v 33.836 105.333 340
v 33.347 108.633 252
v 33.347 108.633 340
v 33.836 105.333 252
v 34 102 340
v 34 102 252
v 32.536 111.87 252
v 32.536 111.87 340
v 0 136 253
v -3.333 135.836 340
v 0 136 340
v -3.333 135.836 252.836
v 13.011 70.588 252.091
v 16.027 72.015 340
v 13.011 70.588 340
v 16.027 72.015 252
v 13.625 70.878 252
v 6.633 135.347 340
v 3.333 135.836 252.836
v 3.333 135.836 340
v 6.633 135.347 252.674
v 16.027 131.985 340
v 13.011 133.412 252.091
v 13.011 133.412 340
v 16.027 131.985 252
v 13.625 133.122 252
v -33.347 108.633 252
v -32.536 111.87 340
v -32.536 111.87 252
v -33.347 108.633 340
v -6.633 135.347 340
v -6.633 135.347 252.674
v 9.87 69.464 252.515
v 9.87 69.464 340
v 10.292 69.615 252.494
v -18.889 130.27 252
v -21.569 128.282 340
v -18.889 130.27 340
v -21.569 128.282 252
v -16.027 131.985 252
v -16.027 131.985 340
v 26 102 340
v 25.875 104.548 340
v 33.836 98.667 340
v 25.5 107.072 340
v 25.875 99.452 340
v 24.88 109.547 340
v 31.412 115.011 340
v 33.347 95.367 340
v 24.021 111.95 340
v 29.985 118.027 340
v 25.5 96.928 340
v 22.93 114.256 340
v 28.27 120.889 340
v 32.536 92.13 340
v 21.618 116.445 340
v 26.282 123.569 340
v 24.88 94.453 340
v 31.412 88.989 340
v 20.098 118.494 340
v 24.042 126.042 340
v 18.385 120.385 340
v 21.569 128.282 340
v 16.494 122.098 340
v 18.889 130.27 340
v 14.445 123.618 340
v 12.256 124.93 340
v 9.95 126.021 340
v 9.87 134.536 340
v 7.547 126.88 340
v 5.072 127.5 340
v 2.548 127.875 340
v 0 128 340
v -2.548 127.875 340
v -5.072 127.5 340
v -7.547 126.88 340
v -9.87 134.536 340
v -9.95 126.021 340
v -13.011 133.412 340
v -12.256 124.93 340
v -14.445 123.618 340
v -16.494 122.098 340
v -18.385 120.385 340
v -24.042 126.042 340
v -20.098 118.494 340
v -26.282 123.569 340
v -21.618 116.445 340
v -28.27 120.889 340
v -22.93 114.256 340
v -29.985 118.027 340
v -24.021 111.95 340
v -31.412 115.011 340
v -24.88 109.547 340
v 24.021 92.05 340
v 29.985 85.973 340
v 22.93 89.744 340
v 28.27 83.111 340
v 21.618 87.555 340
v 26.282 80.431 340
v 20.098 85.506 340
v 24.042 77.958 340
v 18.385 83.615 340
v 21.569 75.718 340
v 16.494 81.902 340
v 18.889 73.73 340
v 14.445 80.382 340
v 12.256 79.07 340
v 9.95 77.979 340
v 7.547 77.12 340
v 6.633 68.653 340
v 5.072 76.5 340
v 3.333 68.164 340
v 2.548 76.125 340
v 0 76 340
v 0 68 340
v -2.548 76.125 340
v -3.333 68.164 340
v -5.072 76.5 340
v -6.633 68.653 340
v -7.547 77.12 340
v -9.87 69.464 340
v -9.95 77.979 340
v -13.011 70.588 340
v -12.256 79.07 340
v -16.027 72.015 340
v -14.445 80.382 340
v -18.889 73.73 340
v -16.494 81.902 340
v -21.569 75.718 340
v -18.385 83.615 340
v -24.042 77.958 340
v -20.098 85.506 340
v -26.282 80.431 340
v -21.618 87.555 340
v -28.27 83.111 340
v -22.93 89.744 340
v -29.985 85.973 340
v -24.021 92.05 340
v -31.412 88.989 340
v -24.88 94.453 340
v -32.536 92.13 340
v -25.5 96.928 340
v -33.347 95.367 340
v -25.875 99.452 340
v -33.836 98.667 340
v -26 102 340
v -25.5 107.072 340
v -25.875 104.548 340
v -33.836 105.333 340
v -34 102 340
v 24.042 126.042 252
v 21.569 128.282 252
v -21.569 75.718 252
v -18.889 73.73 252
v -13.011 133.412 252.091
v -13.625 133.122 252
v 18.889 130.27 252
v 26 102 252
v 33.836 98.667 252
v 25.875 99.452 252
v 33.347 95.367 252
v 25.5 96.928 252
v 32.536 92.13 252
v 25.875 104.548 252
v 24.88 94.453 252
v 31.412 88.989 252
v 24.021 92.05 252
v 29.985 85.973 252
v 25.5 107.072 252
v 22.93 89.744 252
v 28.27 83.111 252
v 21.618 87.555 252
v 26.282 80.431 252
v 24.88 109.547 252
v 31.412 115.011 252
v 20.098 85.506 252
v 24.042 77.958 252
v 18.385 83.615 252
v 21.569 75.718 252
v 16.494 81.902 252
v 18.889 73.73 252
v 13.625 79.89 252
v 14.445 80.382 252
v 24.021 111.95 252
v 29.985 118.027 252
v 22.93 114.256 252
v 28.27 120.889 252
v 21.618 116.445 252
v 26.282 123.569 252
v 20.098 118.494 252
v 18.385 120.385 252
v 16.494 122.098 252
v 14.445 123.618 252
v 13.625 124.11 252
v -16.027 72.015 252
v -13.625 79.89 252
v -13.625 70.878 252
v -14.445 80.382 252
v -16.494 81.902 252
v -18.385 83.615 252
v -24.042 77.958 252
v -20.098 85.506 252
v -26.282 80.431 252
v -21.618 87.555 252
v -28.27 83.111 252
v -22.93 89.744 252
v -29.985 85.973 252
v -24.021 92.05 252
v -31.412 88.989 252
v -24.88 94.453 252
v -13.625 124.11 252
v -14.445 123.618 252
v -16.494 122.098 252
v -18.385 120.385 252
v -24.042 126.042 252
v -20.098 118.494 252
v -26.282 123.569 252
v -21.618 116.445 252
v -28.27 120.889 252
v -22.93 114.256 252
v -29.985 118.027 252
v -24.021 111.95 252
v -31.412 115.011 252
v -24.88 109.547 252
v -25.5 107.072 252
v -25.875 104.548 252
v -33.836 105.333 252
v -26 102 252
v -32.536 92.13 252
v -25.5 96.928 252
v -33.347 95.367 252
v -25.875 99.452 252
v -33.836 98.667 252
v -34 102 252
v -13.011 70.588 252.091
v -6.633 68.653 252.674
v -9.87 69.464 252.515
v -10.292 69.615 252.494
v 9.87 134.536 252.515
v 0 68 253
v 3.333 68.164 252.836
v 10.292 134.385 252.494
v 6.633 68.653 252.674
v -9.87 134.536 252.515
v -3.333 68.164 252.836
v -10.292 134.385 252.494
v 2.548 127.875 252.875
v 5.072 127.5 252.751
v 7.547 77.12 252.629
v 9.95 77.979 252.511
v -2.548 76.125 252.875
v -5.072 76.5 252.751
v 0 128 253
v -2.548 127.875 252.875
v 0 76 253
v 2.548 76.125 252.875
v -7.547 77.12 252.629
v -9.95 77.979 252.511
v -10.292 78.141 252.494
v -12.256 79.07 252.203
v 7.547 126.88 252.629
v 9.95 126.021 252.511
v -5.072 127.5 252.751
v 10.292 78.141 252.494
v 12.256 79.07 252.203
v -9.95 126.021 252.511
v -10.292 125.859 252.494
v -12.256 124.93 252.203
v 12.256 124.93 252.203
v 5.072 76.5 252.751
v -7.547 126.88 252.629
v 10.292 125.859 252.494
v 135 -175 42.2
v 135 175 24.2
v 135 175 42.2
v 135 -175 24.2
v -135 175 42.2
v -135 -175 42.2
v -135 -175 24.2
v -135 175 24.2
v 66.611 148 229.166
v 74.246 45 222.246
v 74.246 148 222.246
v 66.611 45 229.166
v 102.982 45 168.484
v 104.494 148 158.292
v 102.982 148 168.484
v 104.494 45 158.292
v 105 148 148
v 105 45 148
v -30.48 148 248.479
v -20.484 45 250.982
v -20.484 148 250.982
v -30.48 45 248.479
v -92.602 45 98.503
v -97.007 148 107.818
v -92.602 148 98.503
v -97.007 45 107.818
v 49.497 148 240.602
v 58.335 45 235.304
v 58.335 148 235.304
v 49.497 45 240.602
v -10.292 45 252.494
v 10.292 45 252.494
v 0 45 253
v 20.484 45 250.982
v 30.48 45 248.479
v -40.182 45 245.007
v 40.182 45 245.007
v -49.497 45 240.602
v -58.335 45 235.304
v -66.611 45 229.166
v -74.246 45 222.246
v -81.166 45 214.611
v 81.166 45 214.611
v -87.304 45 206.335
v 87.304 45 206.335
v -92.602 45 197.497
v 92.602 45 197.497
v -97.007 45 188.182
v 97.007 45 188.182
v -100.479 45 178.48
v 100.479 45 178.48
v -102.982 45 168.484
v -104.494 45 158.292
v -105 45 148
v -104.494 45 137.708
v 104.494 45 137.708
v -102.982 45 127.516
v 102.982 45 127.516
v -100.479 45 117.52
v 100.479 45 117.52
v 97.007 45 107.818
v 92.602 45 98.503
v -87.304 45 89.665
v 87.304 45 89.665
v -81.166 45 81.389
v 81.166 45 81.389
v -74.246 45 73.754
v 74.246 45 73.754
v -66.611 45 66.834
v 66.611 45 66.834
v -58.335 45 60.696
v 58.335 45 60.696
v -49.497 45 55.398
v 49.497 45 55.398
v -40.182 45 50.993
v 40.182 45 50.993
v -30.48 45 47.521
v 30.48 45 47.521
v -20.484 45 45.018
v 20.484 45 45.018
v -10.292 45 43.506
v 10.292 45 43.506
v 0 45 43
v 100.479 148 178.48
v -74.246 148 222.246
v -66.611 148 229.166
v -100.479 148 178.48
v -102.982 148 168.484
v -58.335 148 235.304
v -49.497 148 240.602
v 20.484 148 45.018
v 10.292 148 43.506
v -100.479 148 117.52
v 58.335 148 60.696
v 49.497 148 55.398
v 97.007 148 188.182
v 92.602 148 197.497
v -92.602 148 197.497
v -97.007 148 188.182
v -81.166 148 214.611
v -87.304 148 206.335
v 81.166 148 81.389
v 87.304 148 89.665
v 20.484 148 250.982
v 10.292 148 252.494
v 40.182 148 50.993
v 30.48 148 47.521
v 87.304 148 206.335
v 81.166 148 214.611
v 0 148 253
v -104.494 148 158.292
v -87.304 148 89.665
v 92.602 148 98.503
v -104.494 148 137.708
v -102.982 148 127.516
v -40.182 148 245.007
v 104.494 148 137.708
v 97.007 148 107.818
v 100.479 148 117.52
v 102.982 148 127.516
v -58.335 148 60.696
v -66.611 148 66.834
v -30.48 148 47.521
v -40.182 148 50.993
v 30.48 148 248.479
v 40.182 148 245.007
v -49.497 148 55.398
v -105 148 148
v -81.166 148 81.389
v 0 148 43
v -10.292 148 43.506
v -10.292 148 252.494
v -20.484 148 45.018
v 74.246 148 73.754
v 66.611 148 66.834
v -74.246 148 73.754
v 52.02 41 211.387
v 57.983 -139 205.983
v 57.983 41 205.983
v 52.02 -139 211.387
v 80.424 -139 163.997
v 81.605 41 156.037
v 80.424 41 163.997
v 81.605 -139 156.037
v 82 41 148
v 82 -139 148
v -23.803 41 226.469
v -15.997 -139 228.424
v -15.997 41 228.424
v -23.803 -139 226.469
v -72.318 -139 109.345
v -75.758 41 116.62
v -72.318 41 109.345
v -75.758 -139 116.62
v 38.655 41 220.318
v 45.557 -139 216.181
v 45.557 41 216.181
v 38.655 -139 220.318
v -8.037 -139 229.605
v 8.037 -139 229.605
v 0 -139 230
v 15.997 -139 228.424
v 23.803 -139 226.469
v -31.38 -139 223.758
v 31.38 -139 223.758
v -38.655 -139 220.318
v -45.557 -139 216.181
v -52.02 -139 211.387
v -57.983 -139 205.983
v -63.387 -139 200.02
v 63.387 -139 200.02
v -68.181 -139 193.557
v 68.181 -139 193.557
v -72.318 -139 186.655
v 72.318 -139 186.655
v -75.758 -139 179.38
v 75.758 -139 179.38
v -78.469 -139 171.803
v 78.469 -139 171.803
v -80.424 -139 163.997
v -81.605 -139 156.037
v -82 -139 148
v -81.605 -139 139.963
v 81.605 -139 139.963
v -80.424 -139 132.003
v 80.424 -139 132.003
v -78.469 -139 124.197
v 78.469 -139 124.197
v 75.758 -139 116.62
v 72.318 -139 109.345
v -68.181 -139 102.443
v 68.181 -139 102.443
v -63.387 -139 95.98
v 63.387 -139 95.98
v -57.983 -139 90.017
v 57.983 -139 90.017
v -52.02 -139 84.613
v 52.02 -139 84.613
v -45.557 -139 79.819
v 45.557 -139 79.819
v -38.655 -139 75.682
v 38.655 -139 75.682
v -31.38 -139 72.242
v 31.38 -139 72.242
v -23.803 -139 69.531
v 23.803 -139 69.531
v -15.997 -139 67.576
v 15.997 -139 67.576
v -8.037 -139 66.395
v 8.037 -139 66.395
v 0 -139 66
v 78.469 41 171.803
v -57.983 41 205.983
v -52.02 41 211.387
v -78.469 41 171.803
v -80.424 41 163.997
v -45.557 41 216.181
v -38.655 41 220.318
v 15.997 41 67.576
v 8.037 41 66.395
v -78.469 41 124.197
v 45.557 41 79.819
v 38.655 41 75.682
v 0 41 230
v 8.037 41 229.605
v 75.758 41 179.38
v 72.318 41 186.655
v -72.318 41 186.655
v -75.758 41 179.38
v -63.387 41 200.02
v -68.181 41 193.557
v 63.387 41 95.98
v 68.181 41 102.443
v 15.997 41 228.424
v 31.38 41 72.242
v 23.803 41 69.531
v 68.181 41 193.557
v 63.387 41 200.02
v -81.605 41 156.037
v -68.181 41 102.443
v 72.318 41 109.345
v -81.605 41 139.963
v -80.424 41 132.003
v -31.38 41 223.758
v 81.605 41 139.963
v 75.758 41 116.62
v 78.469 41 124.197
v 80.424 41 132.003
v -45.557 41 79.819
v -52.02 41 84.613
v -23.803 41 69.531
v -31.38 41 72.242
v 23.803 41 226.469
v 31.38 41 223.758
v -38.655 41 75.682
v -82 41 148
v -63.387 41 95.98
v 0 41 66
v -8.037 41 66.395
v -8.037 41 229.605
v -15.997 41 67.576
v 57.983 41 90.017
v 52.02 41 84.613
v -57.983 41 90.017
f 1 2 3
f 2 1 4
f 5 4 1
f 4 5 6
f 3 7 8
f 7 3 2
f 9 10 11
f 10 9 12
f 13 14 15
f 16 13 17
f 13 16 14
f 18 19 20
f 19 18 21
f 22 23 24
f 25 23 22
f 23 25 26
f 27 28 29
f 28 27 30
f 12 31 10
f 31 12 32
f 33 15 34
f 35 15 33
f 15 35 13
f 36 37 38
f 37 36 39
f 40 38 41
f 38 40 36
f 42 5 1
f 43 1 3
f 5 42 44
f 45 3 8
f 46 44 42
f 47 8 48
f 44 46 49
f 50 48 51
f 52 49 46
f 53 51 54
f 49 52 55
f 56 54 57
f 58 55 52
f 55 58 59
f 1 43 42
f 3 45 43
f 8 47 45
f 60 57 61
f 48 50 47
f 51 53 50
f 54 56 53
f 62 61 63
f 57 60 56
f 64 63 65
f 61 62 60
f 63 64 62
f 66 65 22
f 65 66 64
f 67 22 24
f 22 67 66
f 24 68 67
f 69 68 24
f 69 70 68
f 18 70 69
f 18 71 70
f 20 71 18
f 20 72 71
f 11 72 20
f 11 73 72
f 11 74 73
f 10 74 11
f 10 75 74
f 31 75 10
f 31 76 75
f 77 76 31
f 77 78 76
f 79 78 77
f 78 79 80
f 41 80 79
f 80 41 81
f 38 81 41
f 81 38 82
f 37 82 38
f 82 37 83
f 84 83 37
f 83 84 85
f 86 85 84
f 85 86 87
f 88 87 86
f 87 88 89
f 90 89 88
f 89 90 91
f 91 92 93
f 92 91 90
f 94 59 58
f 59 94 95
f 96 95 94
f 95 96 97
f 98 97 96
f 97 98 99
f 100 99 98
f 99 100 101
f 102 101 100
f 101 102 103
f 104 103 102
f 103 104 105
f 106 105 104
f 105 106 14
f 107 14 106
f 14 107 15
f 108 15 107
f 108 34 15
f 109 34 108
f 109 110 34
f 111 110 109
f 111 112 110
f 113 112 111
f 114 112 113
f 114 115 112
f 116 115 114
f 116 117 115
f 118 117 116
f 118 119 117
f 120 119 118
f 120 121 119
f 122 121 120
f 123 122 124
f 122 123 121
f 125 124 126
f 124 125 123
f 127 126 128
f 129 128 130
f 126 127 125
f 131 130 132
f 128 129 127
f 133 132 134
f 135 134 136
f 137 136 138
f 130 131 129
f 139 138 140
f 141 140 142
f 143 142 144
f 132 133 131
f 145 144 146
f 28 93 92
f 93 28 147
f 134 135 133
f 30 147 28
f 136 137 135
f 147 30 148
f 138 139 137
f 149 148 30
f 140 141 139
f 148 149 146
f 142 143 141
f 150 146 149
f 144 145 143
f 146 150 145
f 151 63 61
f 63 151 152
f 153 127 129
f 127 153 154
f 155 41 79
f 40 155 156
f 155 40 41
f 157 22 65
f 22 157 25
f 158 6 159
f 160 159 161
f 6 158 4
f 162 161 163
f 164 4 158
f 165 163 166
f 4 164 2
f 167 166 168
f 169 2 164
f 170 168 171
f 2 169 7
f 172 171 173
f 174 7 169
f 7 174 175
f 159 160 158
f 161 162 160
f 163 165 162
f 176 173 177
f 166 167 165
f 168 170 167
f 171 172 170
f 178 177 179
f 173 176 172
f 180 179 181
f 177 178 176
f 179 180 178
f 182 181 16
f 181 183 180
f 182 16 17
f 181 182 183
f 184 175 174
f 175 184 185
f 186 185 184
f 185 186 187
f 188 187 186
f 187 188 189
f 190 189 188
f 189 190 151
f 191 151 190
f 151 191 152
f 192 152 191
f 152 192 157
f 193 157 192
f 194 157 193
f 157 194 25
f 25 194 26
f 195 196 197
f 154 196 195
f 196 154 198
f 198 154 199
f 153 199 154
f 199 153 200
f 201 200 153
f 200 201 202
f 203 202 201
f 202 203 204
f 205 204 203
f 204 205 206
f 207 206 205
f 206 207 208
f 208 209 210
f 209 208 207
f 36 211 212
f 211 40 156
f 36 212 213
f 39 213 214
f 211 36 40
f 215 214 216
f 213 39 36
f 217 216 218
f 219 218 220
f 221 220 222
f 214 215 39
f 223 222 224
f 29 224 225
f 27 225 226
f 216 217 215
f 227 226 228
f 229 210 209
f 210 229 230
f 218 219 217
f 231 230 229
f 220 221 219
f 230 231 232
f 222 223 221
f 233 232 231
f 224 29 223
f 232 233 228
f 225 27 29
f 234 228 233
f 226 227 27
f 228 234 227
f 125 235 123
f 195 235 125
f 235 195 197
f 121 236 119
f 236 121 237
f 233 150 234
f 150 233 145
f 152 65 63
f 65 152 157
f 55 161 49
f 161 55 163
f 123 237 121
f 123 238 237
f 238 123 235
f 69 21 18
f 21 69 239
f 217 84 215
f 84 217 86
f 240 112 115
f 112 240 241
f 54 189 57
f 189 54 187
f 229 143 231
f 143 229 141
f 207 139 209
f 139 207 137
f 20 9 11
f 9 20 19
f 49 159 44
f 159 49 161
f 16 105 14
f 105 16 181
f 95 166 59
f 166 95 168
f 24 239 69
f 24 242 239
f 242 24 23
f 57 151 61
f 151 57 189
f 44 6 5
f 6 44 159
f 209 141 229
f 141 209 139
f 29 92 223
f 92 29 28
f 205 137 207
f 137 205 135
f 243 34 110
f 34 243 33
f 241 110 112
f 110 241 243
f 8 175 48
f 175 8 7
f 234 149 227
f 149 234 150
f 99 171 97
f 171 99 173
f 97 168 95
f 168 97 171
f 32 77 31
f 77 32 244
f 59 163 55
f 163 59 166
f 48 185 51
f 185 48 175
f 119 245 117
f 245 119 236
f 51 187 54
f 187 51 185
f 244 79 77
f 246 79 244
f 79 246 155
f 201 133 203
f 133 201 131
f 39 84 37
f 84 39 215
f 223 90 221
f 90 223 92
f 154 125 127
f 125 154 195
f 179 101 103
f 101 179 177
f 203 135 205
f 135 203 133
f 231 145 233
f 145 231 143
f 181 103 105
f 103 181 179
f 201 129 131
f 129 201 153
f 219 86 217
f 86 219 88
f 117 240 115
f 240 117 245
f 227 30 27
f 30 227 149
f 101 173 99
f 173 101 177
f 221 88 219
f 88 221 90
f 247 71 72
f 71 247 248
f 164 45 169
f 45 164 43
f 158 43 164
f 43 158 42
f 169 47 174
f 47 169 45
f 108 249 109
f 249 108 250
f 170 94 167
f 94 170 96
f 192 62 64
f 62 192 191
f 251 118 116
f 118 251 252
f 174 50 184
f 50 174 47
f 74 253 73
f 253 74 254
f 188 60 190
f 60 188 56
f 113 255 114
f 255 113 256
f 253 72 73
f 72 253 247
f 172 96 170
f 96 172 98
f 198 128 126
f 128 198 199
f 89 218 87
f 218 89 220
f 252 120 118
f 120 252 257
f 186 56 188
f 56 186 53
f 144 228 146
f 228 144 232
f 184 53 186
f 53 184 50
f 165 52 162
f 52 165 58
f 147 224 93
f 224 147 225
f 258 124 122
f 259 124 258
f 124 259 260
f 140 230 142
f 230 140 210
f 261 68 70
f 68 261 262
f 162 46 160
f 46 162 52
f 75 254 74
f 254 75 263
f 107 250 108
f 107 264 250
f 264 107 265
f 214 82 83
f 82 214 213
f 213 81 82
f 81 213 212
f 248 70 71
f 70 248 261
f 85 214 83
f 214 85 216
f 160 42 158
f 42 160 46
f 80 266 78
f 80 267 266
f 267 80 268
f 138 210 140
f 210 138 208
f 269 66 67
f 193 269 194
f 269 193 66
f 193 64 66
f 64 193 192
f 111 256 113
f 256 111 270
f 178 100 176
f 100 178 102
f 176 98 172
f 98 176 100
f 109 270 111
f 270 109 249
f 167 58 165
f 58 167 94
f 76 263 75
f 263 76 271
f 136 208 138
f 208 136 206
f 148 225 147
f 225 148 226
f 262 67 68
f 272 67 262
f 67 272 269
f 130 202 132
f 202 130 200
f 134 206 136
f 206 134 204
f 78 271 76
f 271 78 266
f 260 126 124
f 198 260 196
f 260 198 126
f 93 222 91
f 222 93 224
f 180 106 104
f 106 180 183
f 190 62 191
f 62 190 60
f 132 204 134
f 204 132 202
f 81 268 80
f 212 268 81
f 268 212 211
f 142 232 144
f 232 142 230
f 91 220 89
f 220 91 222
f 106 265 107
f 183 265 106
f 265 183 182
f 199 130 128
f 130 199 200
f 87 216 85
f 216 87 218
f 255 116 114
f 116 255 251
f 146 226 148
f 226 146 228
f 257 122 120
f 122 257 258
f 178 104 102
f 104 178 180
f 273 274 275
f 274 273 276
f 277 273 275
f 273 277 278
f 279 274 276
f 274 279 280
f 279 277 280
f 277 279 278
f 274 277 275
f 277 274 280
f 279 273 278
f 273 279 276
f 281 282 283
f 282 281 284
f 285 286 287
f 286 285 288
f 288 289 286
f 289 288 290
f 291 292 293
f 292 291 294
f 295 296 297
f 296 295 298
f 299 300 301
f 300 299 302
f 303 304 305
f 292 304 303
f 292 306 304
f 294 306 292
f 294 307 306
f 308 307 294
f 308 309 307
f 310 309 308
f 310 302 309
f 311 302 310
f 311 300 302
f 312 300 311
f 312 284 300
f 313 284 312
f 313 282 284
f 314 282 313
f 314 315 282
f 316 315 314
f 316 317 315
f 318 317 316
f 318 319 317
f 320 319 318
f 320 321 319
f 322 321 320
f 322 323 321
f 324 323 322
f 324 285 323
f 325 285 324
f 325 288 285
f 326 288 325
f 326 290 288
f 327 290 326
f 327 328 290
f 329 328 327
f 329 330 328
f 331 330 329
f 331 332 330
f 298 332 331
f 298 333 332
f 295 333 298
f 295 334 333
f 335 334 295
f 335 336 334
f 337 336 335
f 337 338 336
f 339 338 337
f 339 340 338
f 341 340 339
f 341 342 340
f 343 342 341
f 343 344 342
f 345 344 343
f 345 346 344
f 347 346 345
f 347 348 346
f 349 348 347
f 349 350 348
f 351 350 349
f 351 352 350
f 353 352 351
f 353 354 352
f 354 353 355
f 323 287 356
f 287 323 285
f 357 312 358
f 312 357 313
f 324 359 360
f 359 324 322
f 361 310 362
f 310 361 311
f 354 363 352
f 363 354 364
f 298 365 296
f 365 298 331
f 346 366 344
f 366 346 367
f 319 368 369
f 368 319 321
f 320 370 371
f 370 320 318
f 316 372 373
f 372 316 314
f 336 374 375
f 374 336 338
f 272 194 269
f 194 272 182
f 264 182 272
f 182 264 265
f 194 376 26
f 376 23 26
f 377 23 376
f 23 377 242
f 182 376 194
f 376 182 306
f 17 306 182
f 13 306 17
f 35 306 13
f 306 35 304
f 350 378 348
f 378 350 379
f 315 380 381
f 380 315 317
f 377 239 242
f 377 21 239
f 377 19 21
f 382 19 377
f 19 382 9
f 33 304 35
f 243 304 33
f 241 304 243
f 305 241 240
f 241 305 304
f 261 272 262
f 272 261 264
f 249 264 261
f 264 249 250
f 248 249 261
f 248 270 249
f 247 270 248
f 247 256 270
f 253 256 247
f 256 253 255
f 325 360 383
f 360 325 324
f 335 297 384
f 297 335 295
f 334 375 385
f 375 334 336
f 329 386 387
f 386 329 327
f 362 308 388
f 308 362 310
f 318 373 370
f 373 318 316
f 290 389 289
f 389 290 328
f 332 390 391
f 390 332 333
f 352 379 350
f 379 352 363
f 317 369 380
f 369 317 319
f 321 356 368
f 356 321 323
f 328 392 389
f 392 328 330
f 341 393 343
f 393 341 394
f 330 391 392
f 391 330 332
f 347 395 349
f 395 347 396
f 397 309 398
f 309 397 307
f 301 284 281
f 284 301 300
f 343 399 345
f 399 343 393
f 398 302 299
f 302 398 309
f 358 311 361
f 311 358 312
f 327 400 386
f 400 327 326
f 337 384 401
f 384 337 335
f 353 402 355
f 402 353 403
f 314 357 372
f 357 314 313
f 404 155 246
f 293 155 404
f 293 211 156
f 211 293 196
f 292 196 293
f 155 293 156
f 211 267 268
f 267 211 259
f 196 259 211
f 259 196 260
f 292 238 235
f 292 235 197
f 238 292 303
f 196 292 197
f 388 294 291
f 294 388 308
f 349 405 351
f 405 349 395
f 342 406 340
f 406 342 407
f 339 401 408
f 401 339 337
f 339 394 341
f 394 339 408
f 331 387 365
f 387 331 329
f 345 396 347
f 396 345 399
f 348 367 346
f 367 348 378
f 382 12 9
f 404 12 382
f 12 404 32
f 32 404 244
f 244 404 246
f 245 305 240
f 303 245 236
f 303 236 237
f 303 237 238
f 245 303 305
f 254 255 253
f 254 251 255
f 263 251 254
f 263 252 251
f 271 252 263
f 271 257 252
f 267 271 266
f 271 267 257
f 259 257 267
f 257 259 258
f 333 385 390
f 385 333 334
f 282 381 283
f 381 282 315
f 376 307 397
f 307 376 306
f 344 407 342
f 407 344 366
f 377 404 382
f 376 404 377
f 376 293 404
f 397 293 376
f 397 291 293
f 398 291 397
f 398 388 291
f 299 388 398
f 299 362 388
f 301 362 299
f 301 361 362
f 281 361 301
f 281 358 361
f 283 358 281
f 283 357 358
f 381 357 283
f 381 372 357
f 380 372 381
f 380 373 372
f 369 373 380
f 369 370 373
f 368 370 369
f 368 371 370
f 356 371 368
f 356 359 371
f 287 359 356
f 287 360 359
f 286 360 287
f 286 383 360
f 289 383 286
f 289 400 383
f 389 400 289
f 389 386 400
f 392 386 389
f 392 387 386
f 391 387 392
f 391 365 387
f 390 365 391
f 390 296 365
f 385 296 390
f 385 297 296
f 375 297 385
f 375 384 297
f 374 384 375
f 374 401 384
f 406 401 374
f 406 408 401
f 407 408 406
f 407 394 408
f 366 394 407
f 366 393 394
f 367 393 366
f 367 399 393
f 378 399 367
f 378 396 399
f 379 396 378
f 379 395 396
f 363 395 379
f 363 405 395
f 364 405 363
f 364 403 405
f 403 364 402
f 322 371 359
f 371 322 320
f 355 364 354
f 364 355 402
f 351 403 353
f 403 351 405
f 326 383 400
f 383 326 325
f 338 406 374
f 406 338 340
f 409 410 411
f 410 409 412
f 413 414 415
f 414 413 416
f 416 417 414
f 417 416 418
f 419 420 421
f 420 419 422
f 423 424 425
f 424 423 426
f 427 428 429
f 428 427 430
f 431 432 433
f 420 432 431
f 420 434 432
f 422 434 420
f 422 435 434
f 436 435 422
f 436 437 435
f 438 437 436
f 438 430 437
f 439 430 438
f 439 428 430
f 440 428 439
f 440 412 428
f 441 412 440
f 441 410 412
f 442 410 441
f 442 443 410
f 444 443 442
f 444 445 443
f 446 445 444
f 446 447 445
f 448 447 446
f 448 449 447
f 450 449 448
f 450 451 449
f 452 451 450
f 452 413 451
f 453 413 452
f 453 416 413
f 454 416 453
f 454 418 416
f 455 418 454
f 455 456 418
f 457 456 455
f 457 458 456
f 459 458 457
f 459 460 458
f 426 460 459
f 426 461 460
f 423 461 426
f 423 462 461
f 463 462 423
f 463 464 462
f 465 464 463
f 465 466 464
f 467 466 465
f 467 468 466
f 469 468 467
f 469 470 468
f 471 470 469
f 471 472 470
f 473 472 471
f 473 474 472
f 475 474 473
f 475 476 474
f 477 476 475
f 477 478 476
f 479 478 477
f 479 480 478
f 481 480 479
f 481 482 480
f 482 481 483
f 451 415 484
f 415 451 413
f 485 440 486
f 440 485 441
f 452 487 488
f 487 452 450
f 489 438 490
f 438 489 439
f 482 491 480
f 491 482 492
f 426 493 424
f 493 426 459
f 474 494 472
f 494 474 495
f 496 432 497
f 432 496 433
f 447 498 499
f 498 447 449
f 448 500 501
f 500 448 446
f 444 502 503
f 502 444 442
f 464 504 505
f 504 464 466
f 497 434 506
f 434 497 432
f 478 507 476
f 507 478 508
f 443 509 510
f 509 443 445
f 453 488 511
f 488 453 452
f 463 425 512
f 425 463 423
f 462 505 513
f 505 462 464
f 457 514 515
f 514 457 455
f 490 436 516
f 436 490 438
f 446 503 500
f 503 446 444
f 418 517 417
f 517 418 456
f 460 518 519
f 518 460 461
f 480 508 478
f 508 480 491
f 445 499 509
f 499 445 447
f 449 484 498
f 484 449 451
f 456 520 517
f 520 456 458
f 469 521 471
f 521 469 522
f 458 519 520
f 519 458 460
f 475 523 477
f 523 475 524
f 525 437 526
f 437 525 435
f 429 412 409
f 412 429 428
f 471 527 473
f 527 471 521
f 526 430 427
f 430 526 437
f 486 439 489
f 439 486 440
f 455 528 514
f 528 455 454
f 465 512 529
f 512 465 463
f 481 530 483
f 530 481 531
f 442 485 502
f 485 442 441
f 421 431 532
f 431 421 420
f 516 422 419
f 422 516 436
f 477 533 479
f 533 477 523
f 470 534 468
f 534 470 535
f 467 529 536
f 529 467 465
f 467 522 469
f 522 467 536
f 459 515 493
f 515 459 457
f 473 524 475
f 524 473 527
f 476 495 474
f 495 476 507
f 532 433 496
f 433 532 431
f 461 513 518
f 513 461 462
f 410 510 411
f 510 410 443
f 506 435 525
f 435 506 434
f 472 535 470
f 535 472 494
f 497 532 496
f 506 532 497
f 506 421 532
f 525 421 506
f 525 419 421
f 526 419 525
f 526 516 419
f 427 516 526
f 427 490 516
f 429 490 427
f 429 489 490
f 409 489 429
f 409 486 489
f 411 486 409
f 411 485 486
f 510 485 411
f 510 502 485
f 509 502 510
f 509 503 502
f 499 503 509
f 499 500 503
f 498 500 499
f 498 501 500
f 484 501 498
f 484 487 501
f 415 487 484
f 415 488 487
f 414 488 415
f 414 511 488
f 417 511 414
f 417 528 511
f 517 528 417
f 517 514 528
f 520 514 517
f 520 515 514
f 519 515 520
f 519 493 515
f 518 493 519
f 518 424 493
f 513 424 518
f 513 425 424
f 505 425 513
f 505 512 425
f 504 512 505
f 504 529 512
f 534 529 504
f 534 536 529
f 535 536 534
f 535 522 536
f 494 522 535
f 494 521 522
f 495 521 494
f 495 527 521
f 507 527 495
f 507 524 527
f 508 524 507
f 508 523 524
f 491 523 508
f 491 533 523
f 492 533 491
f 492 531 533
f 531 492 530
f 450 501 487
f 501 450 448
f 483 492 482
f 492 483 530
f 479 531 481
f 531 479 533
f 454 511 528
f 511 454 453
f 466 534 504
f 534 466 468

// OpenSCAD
// ============================================================================
// Atom Lithography Machine — Parametric OpenSCAD Module (S5.2-03)
// ============================================================================
// part_id           : S5.2-03
// parent_bom_id     : S5.2
// subsystem         : S5
// part_name         : Yagsiz kuru scroll on-vakum pompasi ve geri-akis tutucu
// material          : Al 6061
// temp_stage        : 300 K
// vacuum_grade      : Kaba vakum
// tolerance         : ISO 2768-mK
// computed_mass_kg  : 26.86204
// envelope_mm       : 270.000 x 360.000 x 350.200
// design_maturity   : M0_M1_DETAILED_CAD_DESIGN_ONLY
// no_lab_measurement: true
// iec61508_certified: false
// semi_s2_certified : false
// Units: millimeters (mm)
// ============================================================================

$fn = 64;

// Nominal bounding envelope parameters (mm)
bbox_x = 270.0000;
bbox_y = 360.0000;
bbox_z = 350.2000;

// Part-specific parametric dimensions
speed_m3_h = 15.0;
base_mbar = 0.01;
head_od_mm = 210.0;

// Interface / port parameters (mm)
port_kf25_inlet_od = 40.000;
port_kf25_inlet_bore = 25.000;
port_kf25_exhaust_bore = 25.000;

module part_S5_2_03() {
  union() {
    // Vibration-isolated cast Al baseplate
    translate([0.000, 0.000, 33.200]) cube([270.000, 350.000, 18.000], center=true);
    // Finned dry-scroll compression head
    translate([0.000, 96.500, 148.000]) rotate([90.000, 0.000, 0.000]) cylinder(d=210.000, h=103.000, center=true);
    // 15 m^3/h oil-free TEFC drive motor
    translate([0.000, -49.000, 148.000]) rotate([90.000, 0.000, 0.000]) cylinder(d=164.000, h=180.000, center=true);
    // KF25 molecular-sieve foreline backstream trap
    translate([0.000, 102.000, 296.000]) {
      difference() {
        cylinder(d=68.000, h=88.000, center=true);
        cylinder(d=52.000, h=90.000, center=true);
      }
    }
  }
}

// World assembly mounting transform (global machine frame, mm / deg):
// translate([0.000, -780.000, 0.000]) rotate([0.000, 0.000, 0.000]) part_S5_2_03();

part_S5_2_03();
